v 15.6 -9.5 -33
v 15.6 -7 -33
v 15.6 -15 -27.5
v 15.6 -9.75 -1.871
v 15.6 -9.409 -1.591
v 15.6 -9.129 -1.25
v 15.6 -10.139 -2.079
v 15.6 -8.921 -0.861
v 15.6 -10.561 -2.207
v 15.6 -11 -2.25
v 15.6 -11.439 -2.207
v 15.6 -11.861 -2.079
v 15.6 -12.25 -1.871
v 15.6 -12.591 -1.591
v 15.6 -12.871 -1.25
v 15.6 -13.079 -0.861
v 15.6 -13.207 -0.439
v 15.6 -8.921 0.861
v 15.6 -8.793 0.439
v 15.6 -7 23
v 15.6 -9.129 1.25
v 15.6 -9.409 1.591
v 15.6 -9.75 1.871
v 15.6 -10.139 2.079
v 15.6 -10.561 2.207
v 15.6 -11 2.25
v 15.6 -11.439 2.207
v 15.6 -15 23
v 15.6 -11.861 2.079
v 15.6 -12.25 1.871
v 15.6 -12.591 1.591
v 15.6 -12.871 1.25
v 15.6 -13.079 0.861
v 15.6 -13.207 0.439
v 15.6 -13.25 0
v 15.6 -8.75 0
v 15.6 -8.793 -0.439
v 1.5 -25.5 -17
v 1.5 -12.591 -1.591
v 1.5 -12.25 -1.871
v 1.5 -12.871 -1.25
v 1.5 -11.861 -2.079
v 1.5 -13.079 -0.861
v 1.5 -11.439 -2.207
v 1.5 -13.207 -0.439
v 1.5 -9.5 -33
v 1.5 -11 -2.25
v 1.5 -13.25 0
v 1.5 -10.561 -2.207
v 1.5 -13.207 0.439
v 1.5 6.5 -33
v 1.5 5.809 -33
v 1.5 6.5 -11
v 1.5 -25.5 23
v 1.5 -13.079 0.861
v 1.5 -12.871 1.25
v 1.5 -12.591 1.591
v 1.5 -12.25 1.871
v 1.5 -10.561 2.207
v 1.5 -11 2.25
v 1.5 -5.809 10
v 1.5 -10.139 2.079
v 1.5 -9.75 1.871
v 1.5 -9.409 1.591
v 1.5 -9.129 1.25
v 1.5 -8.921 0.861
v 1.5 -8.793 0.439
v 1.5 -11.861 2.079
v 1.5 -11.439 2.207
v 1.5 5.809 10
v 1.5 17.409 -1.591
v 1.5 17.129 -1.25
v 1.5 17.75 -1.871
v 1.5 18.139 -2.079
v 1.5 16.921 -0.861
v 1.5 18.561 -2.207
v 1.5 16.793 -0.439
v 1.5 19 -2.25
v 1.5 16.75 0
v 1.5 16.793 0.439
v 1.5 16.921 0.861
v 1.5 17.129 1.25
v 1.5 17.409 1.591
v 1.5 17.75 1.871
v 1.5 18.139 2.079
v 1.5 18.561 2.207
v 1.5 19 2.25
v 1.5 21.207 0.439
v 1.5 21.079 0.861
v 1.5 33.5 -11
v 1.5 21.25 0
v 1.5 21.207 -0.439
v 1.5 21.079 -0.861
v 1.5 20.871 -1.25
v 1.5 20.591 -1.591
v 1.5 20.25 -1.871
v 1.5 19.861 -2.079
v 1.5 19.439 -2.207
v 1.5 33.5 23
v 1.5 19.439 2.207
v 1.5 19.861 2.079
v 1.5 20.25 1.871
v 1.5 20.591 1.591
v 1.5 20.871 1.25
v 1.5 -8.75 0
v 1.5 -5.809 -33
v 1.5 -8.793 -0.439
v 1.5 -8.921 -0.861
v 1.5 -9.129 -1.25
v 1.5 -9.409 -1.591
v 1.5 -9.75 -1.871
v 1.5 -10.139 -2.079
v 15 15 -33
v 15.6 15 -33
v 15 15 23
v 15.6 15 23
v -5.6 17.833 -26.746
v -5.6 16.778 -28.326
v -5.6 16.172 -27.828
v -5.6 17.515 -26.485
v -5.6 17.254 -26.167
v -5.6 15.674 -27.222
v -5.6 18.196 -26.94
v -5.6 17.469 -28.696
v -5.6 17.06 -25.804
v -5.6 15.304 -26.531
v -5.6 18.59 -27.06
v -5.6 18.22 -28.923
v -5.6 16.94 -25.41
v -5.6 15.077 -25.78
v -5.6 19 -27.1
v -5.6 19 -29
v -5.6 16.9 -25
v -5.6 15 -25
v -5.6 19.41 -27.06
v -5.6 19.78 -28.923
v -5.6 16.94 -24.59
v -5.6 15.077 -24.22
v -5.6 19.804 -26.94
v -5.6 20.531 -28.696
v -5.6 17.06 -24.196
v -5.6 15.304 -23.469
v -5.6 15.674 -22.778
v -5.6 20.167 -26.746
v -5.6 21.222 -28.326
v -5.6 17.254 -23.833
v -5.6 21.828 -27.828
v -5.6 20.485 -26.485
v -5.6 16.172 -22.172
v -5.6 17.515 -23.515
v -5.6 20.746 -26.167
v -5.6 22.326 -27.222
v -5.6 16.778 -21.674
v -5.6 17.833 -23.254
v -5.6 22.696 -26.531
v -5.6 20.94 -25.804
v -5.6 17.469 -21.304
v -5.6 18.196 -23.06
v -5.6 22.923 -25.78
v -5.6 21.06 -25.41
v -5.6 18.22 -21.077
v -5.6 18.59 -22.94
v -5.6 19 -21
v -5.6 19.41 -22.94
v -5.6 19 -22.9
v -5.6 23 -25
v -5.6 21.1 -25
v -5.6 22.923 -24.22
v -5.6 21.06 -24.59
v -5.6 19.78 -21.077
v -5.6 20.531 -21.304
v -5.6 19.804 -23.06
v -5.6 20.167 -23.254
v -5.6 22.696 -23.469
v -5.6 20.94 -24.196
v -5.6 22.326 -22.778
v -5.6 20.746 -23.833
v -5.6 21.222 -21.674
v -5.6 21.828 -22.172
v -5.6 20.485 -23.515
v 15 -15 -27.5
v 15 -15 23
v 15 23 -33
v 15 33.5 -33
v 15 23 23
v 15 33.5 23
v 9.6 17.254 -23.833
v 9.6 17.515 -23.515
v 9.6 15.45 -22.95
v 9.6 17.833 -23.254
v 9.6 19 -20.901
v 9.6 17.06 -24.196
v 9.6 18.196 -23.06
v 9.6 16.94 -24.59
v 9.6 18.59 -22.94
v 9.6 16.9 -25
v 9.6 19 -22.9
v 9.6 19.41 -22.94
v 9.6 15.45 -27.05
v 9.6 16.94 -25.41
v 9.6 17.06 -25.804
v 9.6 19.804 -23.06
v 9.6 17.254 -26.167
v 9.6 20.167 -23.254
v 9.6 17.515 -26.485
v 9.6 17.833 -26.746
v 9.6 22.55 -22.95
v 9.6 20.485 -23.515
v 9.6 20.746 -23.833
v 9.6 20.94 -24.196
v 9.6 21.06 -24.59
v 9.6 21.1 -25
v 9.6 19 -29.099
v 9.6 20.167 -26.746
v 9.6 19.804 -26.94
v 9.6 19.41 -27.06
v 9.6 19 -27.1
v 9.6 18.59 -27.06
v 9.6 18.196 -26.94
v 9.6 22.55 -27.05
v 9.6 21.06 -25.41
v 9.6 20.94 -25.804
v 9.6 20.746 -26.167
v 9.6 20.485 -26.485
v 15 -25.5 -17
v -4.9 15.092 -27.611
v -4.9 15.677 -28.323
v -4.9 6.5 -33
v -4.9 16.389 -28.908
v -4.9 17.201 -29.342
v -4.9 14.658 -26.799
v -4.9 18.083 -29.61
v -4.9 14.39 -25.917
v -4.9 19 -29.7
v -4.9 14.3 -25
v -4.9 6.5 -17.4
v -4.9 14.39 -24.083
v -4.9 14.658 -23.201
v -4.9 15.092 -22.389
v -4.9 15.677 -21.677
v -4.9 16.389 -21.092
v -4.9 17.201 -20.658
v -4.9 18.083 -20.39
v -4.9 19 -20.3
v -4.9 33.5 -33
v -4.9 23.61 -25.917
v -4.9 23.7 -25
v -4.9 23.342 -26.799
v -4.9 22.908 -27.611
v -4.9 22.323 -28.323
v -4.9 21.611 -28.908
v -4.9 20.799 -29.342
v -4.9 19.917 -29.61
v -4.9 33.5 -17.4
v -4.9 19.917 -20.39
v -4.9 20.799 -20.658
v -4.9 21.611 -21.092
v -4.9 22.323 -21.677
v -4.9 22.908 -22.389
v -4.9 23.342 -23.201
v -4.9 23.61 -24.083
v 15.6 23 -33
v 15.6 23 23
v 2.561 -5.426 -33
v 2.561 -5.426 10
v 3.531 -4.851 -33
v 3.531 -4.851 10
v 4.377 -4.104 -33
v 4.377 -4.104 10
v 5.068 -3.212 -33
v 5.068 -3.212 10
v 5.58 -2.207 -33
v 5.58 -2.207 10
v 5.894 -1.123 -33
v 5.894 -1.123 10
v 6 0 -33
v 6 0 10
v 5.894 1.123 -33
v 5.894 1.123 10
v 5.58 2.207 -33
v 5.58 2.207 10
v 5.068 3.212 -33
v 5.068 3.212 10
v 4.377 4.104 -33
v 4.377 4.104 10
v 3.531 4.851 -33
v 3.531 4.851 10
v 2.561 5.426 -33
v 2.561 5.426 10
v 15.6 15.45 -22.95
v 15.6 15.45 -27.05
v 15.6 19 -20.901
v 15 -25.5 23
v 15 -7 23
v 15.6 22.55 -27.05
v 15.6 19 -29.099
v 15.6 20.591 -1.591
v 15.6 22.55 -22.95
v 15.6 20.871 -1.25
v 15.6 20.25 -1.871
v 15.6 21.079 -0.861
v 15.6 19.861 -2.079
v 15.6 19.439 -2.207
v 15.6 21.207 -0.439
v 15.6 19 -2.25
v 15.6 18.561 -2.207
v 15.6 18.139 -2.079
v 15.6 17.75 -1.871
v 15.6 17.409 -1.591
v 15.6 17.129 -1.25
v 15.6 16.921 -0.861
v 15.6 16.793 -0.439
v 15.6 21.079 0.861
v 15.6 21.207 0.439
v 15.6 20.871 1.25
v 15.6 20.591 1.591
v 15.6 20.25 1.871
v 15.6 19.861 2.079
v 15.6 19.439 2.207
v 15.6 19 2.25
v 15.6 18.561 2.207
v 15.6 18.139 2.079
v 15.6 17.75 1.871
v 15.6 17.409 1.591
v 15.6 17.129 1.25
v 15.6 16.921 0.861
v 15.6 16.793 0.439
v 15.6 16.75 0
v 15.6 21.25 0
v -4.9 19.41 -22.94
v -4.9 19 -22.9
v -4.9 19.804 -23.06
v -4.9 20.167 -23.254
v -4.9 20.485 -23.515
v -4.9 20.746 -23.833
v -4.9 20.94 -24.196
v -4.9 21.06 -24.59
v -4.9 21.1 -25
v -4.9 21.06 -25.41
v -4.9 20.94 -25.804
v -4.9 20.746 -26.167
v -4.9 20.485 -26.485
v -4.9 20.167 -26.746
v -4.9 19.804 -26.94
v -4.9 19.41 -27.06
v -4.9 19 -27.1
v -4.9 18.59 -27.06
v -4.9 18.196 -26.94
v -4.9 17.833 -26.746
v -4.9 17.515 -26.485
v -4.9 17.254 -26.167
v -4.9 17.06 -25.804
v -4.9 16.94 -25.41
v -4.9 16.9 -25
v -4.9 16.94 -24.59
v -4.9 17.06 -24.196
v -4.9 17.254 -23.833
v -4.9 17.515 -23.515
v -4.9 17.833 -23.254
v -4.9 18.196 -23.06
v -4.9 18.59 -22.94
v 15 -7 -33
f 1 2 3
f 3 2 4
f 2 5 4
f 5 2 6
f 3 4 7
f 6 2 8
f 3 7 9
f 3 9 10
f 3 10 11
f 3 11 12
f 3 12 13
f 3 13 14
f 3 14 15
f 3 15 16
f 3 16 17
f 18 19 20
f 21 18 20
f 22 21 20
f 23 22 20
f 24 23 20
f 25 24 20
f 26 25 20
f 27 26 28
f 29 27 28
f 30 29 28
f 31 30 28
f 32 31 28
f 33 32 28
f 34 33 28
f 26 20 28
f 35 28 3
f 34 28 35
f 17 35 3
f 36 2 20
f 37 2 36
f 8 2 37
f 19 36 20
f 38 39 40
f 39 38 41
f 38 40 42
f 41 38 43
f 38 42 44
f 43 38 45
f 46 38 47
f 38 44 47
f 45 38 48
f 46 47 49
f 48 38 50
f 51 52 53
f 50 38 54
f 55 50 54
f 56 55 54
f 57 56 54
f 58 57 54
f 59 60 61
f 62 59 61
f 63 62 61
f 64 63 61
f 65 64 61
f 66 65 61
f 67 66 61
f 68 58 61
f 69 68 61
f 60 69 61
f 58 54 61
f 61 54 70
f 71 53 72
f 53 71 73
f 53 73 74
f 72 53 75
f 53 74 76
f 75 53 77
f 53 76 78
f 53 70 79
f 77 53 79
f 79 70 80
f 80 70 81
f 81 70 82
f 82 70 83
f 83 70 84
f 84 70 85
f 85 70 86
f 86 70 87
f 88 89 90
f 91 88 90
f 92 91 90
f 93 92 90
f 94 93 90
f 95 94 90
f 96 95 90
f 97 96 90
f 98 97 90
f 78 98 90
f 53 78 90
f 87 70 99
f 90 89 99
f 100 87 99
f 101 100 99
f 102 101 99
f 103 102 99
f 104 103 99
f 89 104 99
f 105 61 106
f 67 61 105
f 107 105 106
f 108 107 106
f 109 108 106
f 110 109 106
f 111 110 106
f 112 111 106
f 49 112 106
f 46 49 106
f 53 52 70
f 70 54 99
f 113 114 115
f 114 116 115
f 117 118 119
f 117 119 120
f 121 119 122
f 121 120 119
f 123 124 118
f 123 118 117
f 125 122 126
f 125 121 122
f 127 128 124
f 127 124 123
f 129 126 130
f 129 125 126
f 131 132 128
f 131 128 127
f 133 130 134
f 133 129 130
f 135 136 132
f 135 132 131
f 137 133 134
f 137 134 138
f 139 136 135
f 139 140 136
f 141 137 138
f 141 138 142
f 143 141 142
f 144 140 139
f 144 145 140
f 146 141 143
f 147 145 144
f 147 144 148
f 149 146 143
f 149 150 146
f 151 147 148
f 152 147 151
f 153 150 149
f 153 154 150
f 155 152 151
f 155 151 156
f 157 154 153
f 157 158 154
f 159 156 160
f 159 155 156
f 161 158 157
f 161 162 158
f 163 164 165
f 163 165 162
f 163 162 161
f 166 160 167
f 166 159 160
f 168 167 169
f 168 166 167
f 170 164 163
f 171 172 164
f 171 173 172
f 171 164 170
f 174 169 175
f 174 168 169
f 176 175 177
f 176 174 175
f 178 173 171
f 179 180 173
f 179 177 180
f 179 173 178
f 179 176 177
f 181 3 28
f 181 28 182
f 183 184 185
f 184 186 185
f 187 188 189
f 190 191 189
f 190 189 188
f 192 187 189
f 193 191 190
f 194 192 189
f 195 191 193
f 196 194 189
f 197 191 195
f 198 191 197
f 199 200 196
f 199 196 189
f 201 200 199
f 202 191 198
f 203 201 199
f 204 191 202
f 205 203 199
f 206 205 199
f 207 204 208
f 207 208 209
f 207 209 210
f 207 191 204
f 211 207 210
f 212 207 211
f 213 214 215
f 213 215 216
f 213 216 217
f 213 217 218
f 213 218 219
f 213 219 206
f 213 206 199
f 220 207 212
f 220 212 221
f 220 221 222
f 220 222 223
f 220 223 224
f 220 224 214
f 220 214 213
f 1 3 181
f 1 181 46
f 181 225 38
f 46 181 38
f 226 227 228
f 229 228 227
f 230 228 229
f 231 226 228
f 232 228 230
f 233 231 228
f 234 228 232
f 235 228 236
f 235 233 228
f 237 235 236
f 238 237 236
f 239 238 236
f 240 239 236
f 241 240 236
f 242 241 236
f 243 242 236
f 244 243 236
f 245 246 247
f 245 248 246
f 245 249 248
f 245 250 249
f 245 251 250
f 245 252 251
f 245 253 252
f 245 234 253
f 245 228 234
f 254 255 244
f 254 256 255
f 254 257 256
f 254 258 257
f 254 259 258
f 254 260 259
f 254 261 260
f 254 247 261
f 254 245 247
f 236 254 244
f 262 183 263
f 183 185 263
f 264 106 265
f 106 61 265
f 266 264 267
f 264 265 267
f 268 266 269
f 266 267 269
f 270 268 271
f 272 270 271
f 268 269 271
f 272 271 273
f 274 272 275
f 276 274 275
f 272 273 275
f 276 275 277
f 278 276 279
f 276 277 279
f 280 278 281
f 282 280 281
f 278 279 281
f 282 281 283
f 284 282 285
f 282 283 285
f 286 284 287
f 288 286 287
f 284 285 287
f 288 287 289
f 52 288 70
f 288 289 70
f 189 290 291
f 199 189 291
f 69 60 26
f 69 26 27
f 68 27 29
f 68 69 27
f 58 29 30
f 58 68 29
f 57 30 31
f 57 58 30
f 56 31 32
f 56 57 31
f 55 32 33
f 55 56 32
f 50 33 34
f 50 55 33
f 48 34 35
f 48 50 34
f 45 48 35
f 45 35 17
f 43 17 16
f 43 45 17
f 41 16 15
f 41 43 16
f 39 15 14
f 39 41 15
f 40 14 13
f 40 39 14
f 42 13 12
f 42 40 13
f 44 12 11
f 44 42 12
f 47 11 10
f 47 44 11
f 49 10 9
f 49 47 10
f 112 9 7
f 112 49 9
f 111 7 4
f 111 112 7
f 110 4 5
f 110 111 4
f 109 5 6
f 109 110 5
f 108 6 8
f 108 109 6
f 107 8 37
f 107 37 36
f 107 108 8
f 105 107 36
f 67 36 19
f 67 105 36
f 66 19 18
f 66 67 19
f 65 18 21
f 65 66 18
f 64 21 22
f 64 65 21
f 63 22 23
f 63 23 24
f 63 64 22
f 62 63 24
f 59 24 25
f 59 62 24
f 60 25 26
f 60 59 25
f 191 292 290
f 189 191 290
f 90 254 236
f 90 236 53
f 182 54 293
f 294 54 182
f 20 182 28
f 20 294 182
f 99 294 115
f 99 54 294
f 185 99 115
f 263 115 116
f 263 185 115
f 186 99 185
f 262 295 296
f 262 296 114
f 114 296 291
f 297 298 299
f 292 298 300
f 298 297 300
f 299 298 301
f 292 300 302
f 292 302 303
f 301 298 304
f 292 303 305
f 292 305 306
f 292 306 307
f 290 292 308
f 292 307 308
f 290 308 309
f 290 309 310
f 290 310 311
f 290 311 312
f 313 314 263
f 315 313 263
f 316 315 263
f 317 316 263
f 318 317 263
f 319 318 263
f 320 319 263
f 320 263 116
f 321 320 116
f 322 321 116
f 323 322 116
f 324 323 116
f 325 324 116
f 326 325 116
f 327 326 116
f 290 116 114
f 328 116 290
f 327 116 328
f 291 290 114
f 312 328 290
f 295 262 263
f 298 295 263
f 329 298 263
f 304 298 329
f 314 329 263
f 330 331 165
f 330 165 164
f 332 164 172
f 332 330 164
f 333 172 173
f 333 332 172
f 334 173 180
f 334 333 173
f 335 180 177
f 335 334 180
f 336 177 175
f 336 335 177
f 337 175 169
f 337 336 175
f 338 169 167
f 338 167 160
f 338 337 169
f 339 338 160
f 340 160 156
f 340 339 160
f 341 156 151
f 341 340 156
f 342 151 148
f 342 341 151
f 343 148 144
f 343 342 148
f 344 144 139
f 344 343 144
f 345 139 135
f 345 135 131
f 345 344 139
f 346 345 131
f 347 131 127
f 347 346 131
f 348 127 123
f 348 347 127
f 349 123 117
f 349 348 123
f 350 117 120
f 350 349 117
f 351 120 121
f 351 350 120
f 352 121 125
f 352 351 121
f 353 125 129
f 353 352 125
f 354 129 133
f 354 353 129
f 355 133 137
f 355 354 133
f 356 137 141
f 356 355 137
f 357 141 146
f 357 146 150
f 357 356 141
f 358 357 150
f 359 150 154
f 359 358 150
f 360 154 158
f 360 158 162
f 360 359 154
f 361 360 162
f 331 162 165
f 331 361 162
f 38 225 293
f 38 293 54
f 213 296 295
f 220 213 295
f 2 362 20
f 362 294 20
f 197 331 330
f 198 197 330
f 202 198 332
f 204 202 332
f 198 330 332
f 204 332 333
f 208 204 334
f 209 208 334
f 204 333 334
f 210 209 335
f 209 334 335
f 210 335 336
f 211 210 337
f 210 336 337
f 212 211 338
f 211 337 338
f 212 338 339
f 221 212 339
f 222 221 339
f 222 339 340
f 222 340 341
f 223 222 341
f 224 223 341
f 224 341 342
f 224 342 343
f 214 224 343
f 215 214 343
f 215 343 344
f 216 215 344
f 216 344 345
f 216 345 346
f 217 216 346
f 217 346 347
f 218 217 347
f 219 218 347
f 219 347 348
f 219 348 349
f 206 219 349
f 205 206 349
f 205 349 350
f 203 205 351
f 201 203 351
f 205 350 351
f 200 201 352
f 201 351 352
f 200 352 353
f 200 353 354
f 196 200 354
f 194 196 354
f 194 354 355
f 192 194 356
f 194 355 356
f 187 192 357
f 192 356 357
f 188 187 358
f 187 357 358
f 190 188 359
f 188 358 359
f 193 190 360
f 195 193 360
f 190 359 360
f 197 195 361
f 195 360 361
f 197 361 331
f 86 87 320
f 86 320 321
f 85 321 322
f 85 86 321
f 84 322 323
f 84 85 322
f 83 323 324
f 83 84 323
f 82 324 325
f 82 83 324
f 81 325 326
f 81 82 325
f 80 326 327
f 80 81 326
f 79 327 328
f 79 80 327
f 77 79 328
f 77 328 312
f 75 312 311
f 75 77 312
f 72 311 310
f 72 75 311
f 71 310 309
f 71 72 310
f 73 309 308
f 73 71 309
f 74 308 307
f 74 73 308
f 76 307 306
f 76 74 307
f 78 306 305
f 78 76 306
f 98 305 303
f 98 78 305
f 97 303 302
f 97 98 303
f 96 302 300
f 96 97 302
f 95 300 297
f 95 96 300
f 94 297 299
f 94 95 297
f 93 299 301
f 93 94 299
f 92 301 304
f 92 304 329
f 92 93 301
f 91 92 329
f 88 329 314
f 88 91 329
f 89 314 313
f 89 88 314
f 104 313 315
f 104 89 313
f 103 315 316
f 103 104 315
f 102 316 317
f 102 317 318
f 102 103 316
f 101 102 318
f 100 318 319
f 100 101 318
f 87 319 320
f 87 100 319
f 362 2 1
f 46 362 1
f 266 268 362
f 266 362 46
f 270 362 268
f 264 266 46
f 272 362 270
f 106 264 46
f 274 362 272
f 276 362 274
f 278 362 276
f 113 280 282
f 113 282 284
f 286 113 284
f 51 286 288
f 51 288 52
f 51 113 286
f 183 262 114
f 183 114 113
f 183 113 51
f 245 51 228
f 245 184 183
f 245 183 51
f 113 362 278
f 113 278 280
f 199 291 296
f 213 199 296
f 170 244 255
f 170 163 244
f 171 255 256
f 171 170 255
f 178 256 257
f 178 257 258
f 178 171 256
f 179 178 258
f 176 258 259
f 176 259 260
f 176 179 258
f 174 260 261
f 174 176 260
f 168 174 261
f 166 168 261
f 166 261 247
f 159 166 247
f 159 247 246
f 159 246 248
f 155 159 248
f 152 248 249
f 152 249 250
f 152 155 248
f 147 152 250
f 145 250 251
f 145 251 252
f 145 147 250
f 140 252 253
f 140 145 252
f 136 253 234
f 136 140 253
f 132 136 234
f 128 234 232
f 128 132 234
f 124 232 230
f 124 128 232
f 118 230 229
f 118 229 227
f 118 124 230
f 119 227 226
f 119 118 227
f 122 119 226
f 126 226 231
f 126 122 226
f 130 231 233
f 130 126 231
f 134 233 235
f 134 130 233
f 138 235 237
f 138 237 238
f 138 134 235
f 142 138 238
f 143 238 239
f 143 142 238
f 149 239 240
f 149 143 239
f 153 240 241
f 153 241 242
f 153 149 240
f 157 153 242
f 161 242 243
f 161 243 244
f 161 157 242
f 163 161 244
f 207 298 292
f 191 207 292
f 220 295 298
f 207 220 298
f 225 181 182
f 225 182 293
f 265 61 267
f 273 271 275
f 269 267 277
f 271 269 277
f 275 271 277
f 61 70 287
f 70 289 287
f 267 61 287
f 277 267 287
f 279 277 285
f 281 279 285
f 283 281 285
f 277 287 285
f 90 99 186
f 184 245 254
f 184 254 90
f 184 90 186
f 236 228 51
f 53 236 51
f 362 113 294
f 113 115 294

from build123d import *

# Parameters (mm, degrees)
BOSS_EXTRUDE1_DEPTH                          = 10
BOSS_EXTRUDE1_2_DEPTH                        = 10
CBORE_FOR_M5_HEX_SOCKET_HEAD_CAP_SCR_2_COUNT = 2
CBORE_FOR_M5_HEX_SOCKET_HEAD_CAP_SCR_2_PITCH = 30
BOSS_EXTRUDE2_DEPTH                          = 13
BOSS_EXTRUDE3_DEPTH                          = 23
BOSS_EXTRUDE4_DEPTH                          = 27
SKETCH8_R                                    = 2.1
CUT_EXTRUDE1_DEPTH                           = 52.298148115
CHAMFER1_SIZE                                = 16
CUT_EXTRUDE2_DEPTH                           = 6
SKETCH10_R                                   = 5
SKETCH10_R_2                                 = 2.1
BOSS_EXTRUDE5_DEPTH                          = 0.7
CHAMFER2_SIZE                                = 1


with BuildPart() as part:
    # Sketch1 → Boss-Extrude1 (new, symmetric)
    with BuildSketch(Plane.XY):
        with BuildLine():
            Line((-14, 32.5), (-1.5, 32.5))
            Line((-1.5, 32.5), (-1.5, 5.809475019))
            ThreePointArc((-1.5, 5.809475019), (-6, 0), (-1.5, -5.809475019))
            Line((-1.5, -5.809475019), (-1.5, -24.5))
            Line((-1.5, -24.5), (-14, -24.5))
            Line((-14, -24.5), (-14, 32.5))
        make_face()
    extrude(amount=BOSS_EXTRUDE1_DEPTH, both=True)


with BuildPart() as body_2:
    # Sketch1 → Boss-Extrude1 2 (new, symmetric)
    with BuildSketch(Plane.XY):
        with BuildLine():
            Line((15, 33.5), (15, 23))
            Line((15, 23), (15.6, 23))
            Line((15.6, 23), (15.6, 15))
            Line((15.6, 15), (15, 15))
            Line((15, 15), (15, -7))
            Line((15, -7), (15.6, -7))
            Line((15.6, -7), (15.6, -15))
            Line((15.6, -15), (15, -15))
            Line((15, -15), (15, -25.5))
            Line((15, -25.5), (1.5, -25.5))
            Line((1.5, -25.5), (1.5, -5.809475019))
            ThreePointArc((1.5, -5.809475019), (6, 0), (1.5, 5.809475019))
            Line((1.5, 5.809475019), (1.5, 33.5))
            Line((1.5, 33.5), (15, 33.5))
        make_face()
    extrude(amount=BOSS_EXTRUDE1_2_DEPTH, both=True)


with BuildPart() as cbore_for_m5_hex_socket_head_cap_screw1_tool:
    # Sketch2 → CBORE for M5 Hex Socket Head Cap Screw1 (revolve)
    with BuildSketch(Plane(origin=(-14, -11, 0), x_dir=(0, 0, 1), z_dir=(0, 1, 0))):
        Polygon((0, 0), (0, 29.6), (2.25, 29.6), (2.25, 5.9), (5, 5.9), (5, 0), align=None)
    cbore_for_m5_hex_socket_head_cap_screw1 = revolve(axis=Axis((-20.35, -11, 0), (1, 0, 0)))


with BuildPart() as part_1:
    add(part.part)

    # CBORE for M5 Hex Socket Head Cap Screw1: cut by cbore_for_m5_hex_socket_head_cap_screw1_tool
    add(cbore_for_m5_hex_socket_head_cap_screw1_tool.part, mode=Mode.SUBTRACT)


with BuildPart() as body_2_1:
    add(body_2.part)

    # CBORE for M5 Hex Socket Head Cap Screw1: cut by cbore_for_m5_hex_socket_head_cap_screw1_tool
    add(cbore_for_m5_hex_socket_head_cap_screw1_tool.part, mode=Mode.SUBTRACT)


with BuildPart() as cbore_for_m5_hex_socket_head_cap_scr_2_tool:
    # CBORE for M5 Hex Socket Head Cap Scr 2: CBORE for M5 Hex Socket Head Cap Screw1 ×2
    with Locations(*[(0, i * CBORE_FOR_M5_HEX_SOCKET_HEAD_CAP_SCR_2_PITCH, 0) for i in range(1, CBORE_FOR_M5_HEX_SOCKET_HEAD_CAP_SCR_2_COUNT)]):
        add(cbore_for_m5_hex_socket_head_cap_screw1)


with BuildPart() as part_2:
    add(part_1.part)

    # CBORE for M5 Hex Socket Head Cap Scr 2: cut by cbore_for_m5_hex_socket_head_cap_scr_2_tool
    add(cbore_for_m5_hex_socket_head_cap_scr_2_tool.part, mode=Mode.SUBTRACT)


with BuildPart() as body_2_2:
    add(body_2_1.part)

    # CBORE for M5 Hex Socket Head Cap Scr 2: cut by cbore_for_m5_hex_socket_head_cap_scr_2_tool
    add(cbore_for_m5_hex_socket_head_cap_scr_2_tool.part, mode=Mode.SUBTRACT)

    # Sketch4 → Boss-Extrude2 (add)
    with BuildSketch(Plane.XY.offset(10)):
        Polygon((1.5, 5.809475019), (1.5, -5.809475019), (1.5, -25.5), (15, -25.5), (15, -15), (15.6, -15), (15.6, -7), (15, -7), (15, 15), (15.6, 15), (15.6, 23), (15, 23), (15, 33.5), (1.5, 33.5), align=None)
    extrude(amount=BOSS_EXTRUDE2_DEPTH)

    # Sketch5 → Boss-Extrude3 (add)
    with BuildSketch(Plane(origin=(0, 0, -10), x_dir=(-1, 0, 0), z_dir=(0, 0, -1))):
        with BuildLine():
            Line((-15, -25.5), (-1.5, -25.5))
            Line((-1.5, -25.5), (-1.5, -5.809475019))
            ThreePointArc((-1.5, -5.809475019), (-6, 0), (-1.5, 5.809475019))
            Line((-1.5, 5.809475019), (-1.5, 33.5))
            Line((-1.5, 33.5), (-15, 33.5))
            Line((-15, 33.5), (-15, 23))
            Line((-15, 23), (-15.6, 23))
            Line((-15.6, 23), (-15.6, 15))
            Line((-15.6, 15), (-15, 15))
            Line((-15, 15), (-15, -7))
            Line((-15, -7), (-15.6, -7))
            Line((-15.6, -7), (-15.6, -15))
            Line((-15.6, -15), (-15, -15))
            Line((-15, -15), (-15, -25.5))
        make_face()
    extrude(amount=BOSS_EXTRUDE3_DEPTH)

    # Sketch7 → Boss-Extrude4 (add)
    with BuildSketch(Plane(origin=(0, 33.5, 0), x_dir=(1, 0, 0), z_dir=(0, 1, 0))):
        Polygon((1.5, 33), (-4.9, 33), (-4.9, 17.4), (1.5, 11), align=None)
    extrude(amount=-BOSS_EXTRUDE4_DEPTH)

    # Sketch8 → Cut-Extrude1 (cut, through all)
    with BuildSketch(Plane.ZY.offset(4.9)):
        with Locations((-25, 19)):
            Circle(SKETCH8_R)
    extrude(amount=-CUT_EXTRUDE1_DEPTH, mode=Mode.SUBTRACT)

    # Chamfer1
    chamfer1_edges = [body_2_2.edges().sort_by_distance(p)[0] for p in [
        (8.25, -25.5, -33),
    ]]
    chamfer(chamfer1_edges, length=CHAMFER1_SIZE)

    # Sketch9 → Cut-Extrude2 (cut)
    with BuildSketch(Plane(origin=(15.6, 0, 0), x_dir=(0, 0, -1), z_dir=(1, 0, 0))):
        Polygon((29.099186911, 19), (27.049593456, 22.55), (22.950406544, 22.55), (20.900813089, 19), (22.950406544, 15.45), (27.049593456, 15.45), align=None)
    extrude(amount=-CUT_EXTRUDE2_DEPTH, mode=Mode.SUBTRACT)

    # Sketch10 → Boss-Extrude5 (add)
    with BuildSketch(Plane.ZY.offset(4.9)):
        with Locations((-25, 19)):
            Circle(SKETCH10_R)
        with Locations((-25, 19)):
            Circle(SKETCH10_R_2, mode=Mode.SUBTRACT)
    extrude(amount=BOSS_EXTRUDE5_DEPTH)

    # Chamfer2
    # the kernel refuses this chamfer: 1 mm, written as the material it takes off along each edge
    with BuildSketch(Plane(origin=(-5.6, 19, -25), x_dir=(0, 0, 1), z_dir=(0, -1, 0))) as chamfer2_piece_1_section:
        Polygon((5, -CHAMFER2_SIZE), (5 - CHAMFER2_SIZE, 0), (5, 0), align=None)
    chamfer2_piece_1 = revolve(axis=Axis((-5.6, 19, -25), (-1, 0, 0)), mode=Mode.PRIVATE)
    chamfer2_piece_1 = split(chamfer2_piece_1, bisect_by=Plane(origin=(-4.9, 19, -29.353058273), z_dir=(-1, 0, 0)), keep=Keep.TOP, mode=Mode.PRIVATE)
    add(chamfer2_piece_1, mode=Mode.SUBTRACT)


solid = body_2_2.part
